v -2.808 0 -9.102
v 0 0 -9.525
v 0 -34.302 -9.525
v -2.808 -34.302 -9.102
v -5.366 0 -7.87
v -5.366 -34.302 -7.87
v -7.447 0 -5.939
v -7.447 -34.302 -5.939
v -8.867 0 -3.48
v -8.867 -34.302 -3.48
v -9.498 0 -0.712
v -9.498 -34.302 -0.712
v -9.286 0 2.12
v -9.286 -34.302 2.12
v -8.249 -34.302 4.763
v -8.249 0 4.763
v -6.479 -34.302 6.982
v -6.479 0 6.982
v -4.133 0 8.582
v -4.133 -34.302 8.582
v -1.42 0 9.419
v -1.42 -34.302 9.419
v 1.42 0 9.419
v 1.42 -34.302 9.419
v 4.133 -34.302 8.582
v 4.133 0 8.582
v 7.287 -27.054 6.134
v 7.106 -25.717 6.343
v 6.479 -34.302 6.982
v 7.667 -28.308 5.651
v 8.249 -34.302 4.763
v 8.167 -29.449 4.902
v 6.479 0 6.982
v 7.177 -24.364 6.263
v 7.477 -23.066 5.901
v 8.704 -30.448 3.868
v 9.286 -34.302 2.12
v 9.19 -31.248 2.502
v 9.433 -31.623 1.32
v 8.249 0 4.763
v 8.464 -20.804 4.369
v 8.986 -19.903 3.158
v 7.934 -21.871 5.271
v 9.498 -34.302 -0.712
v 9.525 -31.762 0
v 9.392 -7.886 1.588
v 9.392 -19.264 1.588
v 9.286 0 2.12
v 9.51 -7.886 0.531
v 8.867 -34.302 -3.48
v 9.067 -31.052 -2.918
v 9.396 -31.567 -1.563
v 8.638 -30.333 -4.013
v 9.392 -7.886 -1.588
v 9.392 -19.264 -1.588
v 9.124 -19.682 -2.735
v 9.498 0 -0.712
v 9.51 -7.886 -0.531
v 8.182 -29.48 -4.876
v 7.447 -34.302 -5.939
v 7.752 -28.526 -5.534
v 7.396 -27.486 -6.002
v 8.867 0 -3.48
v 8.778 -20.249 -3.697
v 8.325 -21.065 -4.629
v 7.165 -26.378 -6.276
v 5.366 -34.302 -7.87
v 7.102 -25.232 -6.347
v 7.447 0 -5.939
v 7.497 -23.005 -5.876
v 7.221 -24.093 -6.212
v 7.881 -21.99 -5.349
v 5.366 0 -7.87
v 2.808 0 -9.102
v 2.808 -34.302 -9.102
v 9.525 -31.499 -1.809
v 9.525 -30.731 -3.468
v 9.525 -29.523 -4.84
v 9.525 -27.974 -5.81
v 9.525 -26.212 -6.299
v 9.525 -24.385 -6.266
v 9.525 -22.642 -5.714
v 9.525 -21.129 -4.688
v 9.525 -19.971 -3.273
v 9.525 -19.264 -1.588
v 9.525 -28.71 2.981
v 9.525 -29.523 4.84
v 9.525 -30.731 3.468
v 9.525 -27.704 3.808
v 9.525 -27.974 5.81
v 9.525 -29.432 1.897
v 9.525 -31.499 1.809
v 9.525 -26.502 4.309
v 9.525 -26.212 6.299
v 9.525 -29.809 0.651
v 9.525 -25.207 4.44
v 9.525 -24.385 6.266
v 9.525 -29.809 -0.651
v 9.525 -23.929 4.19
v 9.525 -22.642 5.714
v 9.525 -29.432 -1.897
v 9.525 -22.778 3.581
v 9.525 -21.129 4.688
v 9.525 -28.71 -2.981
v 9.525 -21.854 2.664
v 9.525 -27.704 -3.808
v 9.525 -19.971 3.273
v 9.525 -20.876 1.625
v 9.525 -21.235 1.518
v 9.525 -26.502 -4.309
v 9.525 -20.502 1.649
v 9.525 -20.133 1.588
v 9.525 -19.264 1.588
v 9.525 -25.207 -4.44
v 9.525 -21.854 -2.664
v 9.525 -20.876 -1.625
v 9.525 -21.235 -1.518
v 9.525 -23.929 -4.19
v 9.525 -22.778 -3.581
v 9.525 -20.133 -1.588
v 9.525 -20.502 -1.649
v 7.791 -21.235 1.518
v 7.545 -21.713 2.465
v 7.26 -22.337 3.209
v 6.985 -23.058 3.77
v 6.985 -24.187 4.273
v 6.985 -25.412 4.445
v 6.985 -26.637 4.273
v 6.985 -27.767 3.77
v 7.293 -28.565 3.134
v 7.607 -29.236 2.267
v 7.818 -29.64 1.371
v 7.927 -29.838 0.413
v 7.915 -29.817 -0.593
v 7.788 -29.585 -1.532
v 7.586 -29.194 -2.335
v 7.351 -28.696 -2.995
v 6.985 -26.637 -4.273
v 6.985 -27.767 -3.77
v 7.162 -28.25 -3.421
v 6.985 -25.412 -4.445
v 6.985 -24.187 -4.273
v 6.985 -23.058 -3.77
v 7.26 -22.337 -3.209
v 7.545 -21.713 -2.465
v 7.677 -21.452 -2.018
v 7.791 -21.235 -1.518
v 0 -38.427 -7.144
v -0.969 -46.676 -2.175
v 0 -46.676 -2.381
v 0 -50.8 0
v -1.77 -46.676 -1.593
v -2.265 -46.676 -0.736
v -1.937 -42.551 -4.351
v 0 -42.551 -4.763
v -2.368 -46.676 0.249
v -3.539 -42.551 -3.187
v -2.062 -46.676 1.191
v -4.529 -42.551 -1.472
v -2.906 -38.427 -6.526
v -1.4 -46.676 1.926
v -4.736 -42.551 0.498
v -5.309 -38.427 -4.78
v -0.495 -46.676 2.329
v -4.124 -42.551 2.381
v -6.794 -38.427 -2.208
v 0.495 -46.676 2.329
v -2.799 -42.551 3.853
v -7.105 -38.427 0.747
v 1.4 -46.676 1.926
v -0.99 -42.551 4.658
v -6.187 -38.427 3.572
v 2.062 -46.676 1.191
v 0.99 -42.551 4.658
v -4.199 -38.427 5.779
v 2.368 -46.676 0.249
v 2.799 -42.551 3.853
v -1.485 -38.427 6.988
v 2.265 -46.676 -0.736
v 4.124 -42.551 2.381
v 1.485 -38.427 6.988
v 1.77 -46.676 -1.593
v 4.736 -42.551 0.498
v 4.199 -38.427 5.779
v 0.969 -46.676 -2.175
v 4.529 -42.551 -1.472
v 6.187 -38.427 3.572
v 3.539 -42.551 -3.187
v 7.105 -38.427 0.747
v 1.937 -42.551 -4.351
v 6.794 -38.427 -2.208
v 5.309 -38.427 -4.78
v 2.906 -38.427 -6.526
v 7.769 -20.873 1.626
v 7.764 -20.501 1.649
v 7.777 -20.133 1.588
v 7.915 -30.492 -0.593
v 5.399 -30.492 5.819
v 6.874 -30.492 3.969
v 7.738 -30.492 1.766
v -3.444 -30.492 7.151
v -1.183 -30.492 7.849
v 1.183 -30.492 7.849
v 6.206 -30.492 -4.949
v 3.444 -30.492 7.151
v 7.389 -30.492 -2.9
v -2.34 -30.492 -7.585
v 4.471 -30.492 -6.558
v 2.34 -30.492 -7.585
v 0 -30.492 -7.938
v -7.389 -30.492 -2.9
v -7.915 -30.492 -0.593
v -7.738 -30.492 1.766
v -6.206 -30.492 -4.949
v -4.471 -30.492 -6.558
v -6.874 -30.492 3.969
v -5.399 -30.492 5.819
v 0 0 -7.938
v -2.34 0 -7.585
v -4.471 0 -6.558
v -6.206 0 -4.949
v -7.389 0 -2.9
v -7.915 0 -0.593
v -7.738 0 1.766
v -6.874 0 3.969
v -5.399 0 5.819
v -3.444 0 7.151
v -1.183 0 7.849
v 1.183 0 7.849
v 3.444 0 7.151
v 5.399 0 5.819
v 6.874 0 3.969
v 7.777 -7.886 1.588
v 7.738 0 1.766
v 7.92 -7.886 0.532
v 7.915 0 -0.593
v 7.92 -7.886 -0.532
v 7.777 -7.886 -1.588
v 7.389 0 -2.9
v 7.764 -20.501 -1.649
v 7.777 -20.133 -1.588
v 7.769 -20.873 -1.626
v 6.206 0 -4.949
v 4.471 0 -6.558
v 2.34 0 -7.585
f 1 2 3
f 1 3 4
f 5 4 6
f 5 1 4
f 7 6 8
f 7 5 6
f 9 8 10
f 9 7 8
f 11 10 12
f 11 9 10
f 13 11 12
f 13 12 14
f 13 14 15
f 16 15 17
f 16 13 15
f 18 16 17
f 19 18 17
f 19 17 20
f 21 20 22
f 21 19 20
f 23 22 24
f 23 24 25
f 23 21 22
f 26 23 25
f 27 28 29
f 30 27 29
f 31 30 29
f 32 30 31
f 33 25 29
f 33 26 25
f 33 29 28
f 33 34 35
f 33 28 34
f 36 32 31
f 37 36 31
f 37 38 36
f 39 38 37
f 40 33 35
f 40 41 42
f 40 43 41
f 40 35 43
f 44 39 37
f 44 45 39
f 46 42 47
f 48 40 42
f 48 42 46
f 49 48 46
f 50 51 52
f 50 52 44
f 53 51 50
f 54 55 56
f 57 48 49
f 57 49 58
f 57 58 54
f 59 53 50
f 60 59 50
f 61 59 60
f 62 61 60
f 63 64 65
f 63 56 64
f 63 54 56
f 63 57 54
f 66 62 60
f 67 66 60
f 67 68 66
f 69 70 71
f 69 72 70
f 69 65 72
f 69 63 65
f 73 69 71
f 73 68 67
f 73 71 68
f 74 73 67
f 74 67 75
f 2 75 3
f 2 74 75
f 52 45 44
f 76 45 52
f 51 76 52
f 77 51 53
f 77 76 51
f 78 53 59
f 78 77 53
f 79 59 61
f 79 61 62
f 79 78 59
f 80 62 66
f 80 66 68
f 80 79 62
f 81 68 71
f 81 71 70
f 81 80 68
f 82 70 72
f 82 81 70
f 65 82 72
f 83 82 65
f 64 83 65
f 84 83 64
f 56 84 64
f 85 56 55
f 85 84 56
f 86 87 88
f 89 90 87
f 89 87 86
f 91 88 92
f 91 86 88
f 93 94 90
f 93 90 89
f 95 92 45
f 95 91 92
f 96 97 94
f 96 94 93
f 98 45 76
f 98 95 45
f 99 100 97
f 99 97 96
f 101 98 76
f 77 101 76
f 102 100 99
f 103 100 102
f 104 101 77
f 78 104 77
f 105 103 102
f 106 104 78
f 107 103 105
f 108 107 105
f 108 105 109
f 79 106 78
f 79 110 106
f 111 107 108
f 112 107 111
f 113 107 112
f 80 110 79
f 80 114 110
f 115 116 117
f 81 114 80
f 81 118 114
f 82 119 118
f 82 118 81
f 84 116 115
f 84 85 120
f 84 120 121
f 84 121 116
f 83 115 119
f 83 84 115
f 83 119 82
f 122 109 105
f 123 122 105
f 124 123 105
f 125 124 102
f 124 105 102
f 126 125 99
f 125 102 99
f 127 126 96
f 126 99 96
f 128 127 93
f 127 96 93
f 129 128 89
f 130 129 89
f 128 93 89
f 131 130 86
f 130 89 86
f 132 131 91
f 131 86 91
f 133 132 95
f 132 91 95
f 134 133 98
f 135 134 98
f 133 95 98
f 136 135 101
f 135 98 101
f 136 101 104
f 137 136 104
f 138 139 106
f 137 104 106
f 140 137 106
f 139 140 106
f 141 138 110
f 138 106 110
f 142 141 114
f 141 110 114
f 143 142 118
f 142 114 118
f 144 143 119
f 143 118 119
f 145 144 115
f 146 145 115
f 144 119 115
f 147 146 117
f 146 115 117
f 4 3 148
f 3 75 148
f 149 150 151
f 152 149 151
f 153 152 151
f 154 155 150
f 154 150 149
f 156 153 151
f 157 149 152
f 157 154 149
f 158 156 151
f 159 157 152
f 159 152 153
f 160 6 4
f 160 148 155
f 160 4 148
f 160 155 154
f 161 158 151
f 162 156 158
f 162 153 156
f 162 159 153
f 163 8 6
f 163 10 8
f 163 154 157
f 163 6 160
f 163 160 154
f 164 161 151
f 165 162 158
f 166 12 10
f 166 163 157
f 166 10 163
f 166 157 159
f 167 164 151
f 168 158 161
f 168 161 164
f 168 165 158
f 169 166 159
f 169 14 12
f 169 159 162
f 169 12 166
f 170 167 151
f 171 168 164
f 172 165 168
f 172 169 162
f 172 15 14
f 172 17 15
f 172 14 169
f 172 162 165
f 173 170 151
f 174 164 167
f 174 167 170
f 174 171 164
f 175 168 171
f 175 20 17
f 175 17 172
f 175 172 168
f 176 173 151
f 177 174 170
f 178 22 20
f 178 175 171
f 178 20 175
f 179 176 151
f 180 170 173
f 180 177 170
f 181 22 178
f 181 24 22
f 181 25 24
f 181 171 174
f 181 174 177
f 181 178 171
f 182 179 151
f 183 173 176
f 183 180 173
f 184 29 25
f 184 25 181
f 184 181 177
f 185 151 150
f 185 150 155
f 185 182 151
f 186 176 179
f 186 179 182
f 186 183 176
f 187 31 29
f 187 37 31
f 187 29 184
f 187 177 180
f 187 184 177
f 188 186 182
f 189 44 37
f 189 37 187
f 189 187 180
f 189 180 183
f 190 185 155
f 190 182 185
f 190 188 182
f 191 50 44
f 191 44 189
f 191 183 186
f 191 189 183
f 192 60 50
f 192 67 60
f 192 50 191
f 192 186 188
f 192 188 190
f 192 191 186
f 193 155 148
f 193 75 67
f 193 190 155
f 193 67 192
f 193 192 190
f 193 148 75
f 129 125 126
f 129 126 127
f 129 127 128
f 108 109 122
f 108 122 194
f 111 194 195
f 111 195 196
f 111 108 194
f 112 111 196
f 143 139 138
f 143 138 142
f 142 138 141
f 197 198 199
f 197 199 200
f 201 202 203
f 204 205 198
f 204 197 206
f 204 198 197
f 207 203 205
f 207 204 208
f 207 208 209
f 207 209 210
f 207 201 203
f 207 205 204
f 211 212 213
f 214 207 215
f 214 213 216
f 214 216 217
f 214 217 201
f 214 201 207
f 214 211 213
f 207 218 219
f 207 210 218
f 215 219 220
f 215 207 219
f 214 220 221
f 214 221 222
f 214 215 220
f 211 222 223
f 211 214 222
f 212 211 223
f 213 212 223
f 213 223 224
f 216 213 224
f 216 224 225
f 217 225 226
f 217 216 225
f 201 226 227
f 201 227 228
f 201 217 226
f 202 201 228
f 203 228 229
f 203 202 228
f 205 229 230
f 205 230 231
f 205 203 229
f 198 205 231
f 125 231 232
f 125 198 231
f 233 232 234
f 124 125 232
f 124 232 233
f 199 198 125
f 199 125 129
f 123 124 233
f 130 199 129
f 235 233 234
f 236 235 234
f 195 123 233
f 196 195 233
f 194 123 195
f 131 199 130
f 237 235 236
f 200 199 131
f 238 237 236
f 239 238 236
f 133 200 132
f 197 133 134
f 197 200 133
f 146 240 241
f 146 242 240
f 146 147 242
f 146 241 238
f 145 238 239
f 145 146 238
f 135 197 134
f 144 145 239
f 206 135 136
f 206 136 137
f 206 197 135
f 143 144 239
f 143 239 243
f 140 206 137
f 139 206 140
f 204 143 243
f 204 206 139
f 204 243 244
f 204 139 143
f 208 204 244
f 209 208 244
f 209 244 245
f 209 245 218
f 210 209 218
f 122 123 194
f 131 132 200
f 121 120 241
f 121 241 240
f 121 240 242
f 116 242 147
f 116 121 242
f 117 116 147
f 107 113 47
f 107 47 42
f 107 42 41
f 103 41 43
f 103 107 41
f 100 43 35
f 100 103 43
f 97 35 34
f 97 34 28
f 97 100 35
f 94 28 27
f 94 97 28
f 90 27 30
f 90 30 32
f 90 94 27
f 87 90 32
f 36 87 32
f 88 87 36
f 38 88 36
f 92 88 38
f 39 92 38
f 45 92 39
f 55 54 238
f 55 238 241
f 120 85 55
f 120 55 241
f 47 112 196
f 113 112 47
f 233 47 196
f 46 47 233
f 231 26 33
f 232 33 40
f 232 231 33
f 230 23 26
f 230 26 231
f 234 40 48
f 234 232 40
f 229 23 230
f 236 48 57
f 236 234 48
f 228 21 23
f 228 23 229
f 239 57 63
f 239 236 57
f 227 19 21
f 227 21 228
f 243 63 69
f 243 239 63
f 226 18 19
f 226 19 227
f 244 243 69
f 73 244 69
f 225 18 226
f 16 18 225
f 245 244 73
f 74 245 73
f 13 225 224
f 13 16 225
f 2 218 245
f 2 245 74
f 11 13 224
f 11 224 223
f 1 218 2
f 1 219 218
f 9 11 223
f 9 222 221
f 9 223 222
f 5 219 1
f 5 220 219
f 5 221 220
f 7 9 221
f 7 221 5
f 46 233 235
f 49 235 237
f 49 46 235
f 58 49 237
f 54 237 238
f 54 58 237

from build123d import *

# Parameters (mm, degrees)
BOSS_EXTRUDE1_REACH     = 57.084
SENSOR_R                = 6.35
SKETCH4_R               = 4.445
CUT_EXTRUDE1_DEPTH      = 2.54
CUT_EXTRUDE2_REACH      = 57.084
CUT_EXTRUDE2_END_RADIUS = 7.9375


with BuildPart() as part:
    # Sketch1 → mainBody (revolve)
    with BuildSketch(Plane(origin=(0, 0, 0), x_dir=(0, 0, -1), z_dir=(1, 0, 0)), mode=Mode.PRIVATE) as mainbody_sk:
        Polygon((-9.525, 0), (-7.9375, 0), (-7.9375, -30.492216058), (0, -30.492216058), (0, -50.8), (-9.525, -34.302216058), align=None)
    revolve(mainbody_sk.sketch.rotate(Axis((0, 0, 0), (0, 1, 0)), 180), axis=Axis((0, 0, 0), (0, 1, 0)))

    # sensor → Boss-Extrude1 (add, up to next)
    with BuildSketch(Plane(origin=(9.525, 0, 0), x_dir=(0, 0, -1), z_dir=(1, 0, 0)), mode=Mode.PRIVATE) as boss_extrude1_sk1:
        with Locations((0, -25.412216058)):
            Circle(SENSOR_R)
    boss_extrude1_tool1 = extrude(boss_extrude1_sk1.sketch, amount=-BOSS_EXTRUDE1_REACH, mode=Mode.PRIVATE) - part.part
    add(boss_extrude1_tool1.solids().sort_by_distance((9.525, -25.412216, 0))[0])
    add(boss_extrude1_tool1.solids().sort_by_distance((9.525, -25.412216, 0))[1])

    # Sketch4 → Cut-Extrude1 (cut)
    with BuildSketch(Plane(origin=(9.525, 0, 0), x_dir=(0, 0, -1), z_dir=(1, 0, 0))):
        with Locations((0, -25.412216058)):
            Circle(SKETCH4_R)
    extrude(amount=-CUT_EXTRUDE1_DEPTH, mode=Mode.SUBTRACT)

    # Cut-Extrude2: up to this cylinder (the profile starts outside it)
    cut_extrude2_end = Plane(origin=(0, -14.917784, 0), z_dir=(0, -1, 0)) * Cylinder(CUT_EXTRUDE2_END_RADIUS, 131.043, mode=Mode.PRIVATE)
    # Sketch5 → Cut-Extrude2 (cut, up to the surface)
    with BuildSketch(Plane(origin=(9.525, 0, 0), x_dir=(0, 0, -1), z_dir=(1, 0, 0)), mode=Mode.PRIVATE) as cut_extrude2_sk1:
        with BuildLine():
            Line((-1.5875, -7.886216058), (1.5875, -7.886216058))
            Line((1.5875, -7.886216058), (1.5875, -20.132735353))
            ThreePointArc((1.5875, -20.132735353), (0, -22.237216058), (-1.5875, -20.132735353))
            Line((-1.5875, -20.132735353), (-1.5875, -7.886216058))
        make_face()
    cut_extrude2_tool1 = extrude(cut_extrude2_sk1.sketch, amount=-CUT_EXTRUDE2_REACH, mode=Mode.PRIVATE) - cut_extrude2_end
    add(cut_extrude2_tool1.solids().sort_by_distance((9.525, -14.917784, 0))[0], mode=Mode.SUBTRACT)


solid = part.part
